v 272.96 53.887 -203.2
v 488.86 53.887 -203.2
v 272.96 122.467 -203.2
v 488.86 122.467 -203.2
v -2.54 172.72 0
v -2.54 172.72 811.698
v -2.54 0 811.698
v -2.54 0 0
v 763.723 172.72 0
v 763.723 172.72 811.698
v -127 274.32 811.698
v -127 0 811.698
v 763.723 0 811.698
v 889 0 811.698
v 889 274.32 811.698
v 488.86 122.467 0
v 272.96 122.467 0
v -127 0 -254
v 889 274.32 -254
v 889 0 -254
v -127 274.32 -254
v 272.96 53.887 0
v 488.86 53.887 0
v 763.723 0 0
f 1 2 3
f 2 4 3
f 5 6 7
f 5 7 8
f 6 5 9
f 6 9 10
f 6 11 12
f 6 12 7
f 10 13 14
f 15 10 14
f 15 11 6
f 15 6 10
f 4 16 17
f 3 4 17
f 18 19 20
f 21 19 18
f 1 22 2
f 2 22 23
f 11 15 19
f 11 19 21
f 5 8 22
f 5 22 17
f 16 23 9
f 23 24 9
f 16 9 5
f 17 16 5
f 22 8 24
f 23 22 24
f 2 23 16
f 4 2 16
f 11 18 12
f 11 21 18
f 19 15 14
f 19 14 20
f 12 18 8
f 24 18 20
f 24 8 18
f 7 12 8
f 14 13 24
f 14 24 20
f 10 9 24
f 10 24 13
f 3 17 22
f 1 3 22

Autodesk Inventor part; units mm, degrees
ref_plane "YZ Plane" through (0, 0, 0) normal (1, 0, 0) x (0, 1, 0)
ref_plane "XZ Plane" through (0, 0, 0) normal (0, 1, 0) x (-1, 0, 0)
ref_plane "XY Plane" through (0, 0, 0) normal (0, 0, 1) x (1, 0, 0)
sketch "Sketch1" plane through (38.1, 172.72, 38.1) normal (0, 1, 0) x (-1, 0, 0)
  line L0 (38.1, 773.5975) -> (-850.9, 773.5975)
  line L1 (38.1, 773.5975) -> (165.1, 773.5975)
  line L2 (165.1, 773.5975) -> (165.1, -38.1)
  line L3 (165.1, -38.1) -> (165.1, -241.3)
  line L4 (165.1, -241.3) -> (-850.9, -241.3)
  line L5 (-850.9, -241.3) -> (-850.9, 773.5975)
  line L6 (165.1, -241.3) -> (165.1, -292.1)
  line L7 (165.1, -292.1) -> (-850.9, -292.1)
  line L8 (-850.9, -292.1) -> (-850.9, -241.3)
  point P0 (38.1, -38.1)
  dimension "d0" = 889
  dimension "d1" = 127
  dimension "d2" = 203.2
  dimension "d3" = 1014.8975
  dimension "d4" = 811.6975
  dimension "d9" = 50.8
sketch "Sketch2" plane through (0, 15.24, 0) normal (0, 0, -1) x (-1, 0, 0)
  line L0 (-309.1034, 107.227) -> (-309.1034, 38.647)
  line L1 (-272.9596, 74.2658) -> (-488.8596, 74.2658)
  line L2 (-272.9596, 38.647) -> (-488.8596, 38.647)
  line L3 (-488.8596, 38.647) -> (-488.8596, 107.227)
  line L4 (-488.8596, 107.227) -> (-272.9596, 107.227)
  line L5 (-272.9596, 107.227) -> (-272.9596, 38.647)
  point P0 (0, -15.24)
  dimension "d5" = 215.9
  dimension "d6" = 68.58
ref_plane "Work Plane1" through (272.9596, 122.4669, 0) normal (0, 1, 0) x (1, 0, 0)
sketch "Sketch3" plane through (272.9596, 122.4669, 0) normal (0, 1, 0) x (1, 0, 0)
  point P0 (-272.9596, 0)
extrude "Extrusion2" add sketch "Sketch1" along normal blind 101.6
sketch "Sketch4" plane through (38.1, 172.72, 38.1) normal (0, -1, 0) x (1, 0, 0)
  line L0 (-165.1, -292.1) -> (-165.1, 773.5975) projected
  line L1 (-165.1, -292.1) -> (-165.1, 773.5975)
  line L2 (-165.1, 773.5975) -> (-38.1, 773.5975)
  line L3 (-165.1, 773.5975) -> (850.9, 773.5975) projected
  line L4 (-38.1, -38.1) -> (-38.1, 773.5975)
  line L5 (-38.1, -38.1) -> (723.083, -38.1)
  line L6 (723.083, -38.1) -> (723.083, 773.5975)
  line L7 (723.083, 773.5975) -> (850.9, 773.5975)
  line L8 (850.9, 773.5975) -> (850.9, -292.1) projected
  line L9 (850.9, 773.5975) -> (850.9, -292.1)
  line L10 (850.9, -292.1) -> (-165.1, -292.1) projected
  line L11 (850.9, -292.1) -> (-165.1, -292.1)
extrude "Extrusion3" add sketch "Sketch4" along normal blind 172.72 contours L0 L2 L4 L5 L6 L3 L8 L10
extrude "Extrusion4" cut sketch "Sketch2" along normal blind 203.2
sketch "Sketch5" plane through (761.183, 172.72, 0) normal (-1, 0, 0) x (0, 0, 1)
  line L0 (0, -172.72) -> (811.6975, -172.72) projected
  line L1 (0, 0) -> (0, -172.72) projected
  line L2 (811.6975, -172.72) -> (0, -172.72)
  line L3 (0, -172.72) -> (0, 0)
  line L4 (0, 0) -> (811.6975, 0)
  line L5 (811.6975, 0) -> (811.6975, -172.72)
  point P0 (0, -172.72)
extrude "Extrusion5" cut sketch "Sketch5" against normal blind 2.54
sketch "Sketch6" plane through (0, 172.72, 811.6975) normal (1, 0, 0) x (0, 0, -1)
  line L0 (0, -172.72) -> (1065.6975, -172.72) projected
  line L1 (0, 0) -> (811.6975, 0) projected
  line L2 (0, -172.72) -> (811.6975, -172.72)
  line L3 (811.6975, -172.72) -> (811.6975, 0)
  line L4 (811.6975, 0) -> (0, 0)
  line L5 (0, 0) -> (0, -172.72)
  point P0 (811.6975, -172.72)
extrude "Extrusion6" cut sketch "Sketch6" against normal blind 2.54
properties part number "ExpansionCard1"
